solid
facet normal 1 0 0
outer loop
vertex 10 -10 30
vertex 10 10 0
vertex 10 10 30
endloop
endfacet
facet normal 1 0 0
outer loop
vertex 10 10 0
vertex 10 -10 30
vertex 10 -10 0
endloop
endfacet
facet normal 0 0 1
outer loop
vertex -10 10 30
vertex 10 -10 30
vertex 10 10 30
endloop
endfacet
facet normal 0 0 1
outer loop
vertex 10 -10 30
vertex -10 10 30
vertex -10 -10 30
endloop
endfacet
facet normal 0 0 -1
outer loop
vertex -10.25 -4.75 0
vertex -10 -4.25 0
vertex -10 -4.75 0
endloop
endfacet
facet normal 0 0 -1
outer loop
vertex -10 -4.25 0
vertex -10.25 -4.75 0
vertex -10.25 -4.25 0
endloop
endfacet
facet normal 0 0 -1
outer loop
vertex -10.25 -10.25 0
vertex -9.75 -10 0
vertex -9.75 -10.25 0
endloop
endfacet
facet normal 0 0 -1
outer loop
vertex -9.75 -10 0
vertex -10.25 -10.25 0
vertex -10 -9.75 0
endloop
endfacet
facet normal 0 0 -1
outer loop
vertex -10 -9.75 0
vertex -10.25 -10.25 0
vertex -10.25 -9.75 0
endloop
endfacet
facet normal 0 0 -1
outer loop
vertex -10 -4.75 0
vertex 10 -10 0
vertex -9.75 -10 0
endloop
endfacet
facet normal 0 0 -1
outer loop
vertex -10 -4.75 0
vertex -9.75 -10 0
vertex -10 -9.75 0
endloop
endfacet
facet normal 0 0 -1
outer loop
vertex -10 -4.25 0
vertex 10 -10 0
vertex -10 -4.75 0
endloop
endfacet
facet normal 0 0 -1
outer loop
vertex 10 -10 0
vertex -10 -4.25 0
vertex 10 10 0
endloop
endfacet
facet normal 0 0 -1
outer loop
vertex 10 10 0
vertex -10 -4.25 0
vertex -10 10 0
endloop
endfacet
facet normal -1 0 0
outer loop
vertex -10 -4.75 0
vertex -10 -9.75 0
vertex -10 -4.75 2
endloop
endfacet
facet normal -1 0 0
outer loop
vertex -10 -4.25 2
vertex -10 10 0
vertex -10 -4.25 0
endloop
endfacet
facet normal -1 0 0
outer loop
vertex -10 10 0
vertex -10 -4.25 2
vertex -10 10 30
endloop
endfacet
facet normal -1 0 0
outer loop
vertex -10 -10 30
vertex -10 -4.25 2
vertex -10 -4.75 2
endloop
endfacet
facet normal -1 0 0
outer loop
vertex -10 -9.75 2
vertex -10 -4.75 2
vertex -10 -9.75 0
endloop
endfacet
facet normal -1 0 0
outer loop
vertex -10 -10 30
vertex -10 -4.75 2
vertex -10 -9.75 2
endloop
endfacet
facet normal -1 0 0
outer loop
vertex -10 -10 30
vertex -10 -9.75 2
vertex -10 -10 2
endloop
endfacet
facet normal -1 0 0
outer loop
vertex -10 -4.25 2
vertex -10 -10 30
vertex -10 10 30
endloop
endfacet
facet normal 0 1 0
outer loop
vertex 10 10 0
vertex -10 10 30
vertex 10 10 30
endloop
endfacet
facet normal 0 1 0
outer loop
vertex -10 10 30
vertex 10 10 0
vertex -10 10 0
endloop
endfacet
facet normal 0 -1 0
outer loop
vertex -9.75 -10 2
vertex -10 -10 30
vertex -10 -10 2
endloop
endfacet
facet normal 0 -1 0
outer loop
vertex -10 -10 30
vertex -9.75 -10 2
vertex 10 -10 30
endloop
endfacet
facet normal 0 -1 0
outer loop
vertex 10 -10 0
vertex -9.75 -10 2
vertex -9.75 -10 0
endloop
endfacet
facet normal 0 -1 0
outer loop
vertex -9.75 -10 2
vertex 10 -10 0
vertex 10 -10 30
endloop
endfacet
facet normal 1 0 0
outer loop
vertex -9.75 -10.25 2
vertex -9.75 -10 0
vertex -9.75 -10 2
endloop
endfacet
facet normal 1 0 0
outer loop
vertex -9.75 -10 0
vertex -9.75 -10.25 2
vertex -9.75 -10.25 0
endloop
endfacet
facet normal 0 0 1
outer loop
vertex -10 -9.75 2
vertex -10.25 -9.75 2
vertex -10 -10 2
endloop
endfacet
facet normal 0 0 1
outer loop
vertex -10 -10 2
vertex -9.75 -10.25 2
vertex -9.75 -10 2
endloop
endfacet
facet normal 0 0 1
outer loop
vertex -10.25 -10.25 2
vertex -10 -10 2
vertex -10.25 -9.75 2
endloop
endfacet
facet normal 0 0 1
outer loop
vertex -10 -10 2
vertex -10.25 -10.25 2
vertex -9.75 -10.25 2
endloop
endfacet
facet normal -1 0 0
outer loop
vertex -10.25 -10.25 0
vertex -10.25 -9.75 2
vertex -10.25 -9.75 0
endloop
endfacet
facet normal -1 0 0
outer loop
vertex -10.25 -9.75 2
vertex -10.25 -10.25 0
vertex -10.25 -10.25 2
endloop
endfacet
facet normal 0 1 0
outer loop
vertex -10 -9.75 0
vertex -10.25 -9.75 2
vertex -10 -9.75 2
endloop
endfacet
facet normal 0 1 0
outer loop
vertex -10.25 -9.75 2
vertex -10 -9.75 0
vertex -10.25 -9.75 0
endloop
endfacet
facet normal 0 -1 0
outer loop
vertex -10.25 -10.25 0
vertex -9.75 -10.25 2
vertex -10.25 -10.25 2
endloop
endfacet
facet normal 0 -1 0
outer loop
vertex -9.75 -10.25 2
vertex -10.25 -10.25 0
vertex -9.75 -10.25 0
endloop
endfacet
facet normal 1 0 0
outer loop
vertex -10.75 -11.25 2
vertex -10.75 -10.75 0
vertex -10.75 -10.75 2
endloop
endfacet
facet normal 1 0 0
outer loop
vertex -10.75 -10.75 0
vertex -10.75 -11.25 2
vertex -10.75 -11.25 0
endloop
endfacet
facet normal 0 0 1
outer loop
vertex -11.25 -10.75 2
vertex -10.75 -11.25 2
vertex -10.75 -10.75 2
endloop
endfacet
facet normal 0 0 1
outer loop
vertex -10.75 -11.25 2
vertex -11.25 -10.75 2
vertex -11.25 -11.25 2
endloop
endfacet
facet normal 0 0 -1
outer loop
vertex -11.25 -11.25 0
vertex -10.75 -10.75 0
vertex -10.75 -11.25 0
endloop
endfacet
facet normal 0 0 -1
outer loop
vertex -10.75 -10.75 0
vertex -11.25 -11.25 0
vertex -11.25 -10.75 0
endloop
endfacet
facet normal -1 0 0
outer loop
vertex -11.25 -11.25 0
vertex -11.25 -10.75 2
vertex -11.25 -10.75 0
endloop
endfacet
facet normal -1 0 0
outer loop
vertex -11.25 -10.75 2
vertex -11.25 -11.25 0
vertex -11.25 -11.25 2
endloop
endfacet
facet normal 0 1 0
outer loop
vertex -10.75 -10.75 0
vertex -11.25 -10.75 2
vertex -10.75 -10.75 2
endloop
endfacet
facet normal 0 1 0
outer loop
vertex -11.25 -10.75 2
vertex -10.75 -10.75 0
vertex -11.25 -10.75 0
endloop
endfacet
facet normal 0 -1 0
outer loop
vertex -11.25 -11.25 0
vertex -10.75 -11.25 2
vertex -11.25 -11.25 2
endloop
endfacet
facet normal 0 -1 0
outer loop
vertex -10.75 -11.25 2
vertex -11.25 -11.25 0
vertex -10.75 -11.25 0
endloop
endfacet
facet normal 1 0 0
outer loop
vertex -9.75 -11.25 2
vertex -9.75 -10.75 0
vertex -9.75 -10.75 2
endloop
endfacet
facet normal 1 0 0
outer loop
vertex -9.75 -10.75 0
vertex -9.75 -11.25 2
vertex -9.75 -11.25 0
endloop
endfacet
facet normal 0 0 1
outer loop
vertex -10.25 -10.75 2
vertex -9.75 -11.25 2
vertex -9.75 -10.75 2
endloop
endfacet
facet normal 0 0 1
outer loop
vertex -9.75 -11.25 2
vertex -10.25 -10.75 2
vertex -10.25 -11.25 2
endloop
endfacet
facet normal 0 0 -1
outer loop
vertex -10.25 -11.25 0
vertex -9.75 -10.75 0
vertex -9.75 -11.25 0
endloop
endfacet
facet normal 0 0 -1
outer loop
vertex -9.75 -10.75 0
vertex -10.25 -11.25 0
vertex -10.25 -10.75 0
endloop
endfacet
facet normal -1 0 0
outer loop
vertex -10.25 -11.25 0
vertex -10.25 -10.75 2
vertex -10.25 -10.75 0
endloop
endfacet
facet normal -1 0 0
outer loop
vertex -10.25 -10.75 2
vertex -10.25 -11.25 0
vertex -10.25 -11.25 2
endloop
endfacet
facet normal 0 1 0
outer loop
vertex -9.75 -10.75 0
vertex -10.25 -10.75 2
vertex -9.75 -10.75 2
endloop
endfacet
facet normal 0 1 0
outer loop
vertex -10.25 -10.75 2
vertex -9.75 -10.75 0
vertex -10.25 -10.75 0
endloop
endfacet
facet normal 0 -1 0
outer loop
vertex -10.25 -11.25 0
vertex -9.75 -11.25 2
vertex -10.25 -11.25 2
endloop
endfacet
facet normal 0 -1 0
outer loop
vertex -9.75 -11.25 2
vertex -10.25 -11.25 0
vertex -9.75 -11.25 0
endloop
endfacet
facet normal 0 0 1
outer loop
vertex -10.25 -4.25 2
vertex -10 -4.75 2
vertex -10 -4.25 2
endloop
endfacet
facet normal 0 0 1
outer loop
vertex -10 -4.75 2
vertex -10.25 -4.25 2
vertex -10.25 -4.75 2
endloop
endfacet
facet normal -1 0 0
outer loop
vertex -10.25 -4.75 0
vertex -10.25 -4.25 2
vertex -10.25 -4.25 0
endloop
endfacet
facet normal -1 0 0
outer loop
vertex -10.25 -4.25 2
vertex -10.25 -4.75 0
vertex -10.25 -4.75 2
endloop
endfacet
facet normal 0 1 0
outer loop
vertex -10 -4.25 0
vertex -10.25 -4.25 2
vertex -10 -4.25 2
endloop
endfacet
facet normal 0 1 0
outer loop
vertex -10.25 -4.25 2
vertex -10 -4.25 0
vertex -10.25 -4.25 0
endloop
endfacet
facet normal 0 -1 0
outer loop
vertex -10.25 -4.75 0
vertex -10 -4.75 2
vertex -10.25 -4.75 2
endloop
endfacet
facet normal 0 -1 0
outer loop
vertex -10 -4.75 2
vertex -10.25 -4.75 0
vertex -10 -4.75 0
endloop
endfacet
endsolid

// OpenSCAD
translate([0, 0, 15]) color([0,1,0]) cube([20, 20, 30], center=true);
translate([-10, -10, 1]) color([1,0,0]) cube([0.5, 0.5, 2], center=true);
translate([-11, -11, 1]) color([1,0,0]) cube([0.5, 0.5, 2], center=true);
translate([-10, -11, 1]) color([1,0,0]) cube([0.5, 0.5, 2], center=true);
translate([-10, -4.5, 1]) color([1,0,0]) cube([0.5, 0.5, 2], center=true);
